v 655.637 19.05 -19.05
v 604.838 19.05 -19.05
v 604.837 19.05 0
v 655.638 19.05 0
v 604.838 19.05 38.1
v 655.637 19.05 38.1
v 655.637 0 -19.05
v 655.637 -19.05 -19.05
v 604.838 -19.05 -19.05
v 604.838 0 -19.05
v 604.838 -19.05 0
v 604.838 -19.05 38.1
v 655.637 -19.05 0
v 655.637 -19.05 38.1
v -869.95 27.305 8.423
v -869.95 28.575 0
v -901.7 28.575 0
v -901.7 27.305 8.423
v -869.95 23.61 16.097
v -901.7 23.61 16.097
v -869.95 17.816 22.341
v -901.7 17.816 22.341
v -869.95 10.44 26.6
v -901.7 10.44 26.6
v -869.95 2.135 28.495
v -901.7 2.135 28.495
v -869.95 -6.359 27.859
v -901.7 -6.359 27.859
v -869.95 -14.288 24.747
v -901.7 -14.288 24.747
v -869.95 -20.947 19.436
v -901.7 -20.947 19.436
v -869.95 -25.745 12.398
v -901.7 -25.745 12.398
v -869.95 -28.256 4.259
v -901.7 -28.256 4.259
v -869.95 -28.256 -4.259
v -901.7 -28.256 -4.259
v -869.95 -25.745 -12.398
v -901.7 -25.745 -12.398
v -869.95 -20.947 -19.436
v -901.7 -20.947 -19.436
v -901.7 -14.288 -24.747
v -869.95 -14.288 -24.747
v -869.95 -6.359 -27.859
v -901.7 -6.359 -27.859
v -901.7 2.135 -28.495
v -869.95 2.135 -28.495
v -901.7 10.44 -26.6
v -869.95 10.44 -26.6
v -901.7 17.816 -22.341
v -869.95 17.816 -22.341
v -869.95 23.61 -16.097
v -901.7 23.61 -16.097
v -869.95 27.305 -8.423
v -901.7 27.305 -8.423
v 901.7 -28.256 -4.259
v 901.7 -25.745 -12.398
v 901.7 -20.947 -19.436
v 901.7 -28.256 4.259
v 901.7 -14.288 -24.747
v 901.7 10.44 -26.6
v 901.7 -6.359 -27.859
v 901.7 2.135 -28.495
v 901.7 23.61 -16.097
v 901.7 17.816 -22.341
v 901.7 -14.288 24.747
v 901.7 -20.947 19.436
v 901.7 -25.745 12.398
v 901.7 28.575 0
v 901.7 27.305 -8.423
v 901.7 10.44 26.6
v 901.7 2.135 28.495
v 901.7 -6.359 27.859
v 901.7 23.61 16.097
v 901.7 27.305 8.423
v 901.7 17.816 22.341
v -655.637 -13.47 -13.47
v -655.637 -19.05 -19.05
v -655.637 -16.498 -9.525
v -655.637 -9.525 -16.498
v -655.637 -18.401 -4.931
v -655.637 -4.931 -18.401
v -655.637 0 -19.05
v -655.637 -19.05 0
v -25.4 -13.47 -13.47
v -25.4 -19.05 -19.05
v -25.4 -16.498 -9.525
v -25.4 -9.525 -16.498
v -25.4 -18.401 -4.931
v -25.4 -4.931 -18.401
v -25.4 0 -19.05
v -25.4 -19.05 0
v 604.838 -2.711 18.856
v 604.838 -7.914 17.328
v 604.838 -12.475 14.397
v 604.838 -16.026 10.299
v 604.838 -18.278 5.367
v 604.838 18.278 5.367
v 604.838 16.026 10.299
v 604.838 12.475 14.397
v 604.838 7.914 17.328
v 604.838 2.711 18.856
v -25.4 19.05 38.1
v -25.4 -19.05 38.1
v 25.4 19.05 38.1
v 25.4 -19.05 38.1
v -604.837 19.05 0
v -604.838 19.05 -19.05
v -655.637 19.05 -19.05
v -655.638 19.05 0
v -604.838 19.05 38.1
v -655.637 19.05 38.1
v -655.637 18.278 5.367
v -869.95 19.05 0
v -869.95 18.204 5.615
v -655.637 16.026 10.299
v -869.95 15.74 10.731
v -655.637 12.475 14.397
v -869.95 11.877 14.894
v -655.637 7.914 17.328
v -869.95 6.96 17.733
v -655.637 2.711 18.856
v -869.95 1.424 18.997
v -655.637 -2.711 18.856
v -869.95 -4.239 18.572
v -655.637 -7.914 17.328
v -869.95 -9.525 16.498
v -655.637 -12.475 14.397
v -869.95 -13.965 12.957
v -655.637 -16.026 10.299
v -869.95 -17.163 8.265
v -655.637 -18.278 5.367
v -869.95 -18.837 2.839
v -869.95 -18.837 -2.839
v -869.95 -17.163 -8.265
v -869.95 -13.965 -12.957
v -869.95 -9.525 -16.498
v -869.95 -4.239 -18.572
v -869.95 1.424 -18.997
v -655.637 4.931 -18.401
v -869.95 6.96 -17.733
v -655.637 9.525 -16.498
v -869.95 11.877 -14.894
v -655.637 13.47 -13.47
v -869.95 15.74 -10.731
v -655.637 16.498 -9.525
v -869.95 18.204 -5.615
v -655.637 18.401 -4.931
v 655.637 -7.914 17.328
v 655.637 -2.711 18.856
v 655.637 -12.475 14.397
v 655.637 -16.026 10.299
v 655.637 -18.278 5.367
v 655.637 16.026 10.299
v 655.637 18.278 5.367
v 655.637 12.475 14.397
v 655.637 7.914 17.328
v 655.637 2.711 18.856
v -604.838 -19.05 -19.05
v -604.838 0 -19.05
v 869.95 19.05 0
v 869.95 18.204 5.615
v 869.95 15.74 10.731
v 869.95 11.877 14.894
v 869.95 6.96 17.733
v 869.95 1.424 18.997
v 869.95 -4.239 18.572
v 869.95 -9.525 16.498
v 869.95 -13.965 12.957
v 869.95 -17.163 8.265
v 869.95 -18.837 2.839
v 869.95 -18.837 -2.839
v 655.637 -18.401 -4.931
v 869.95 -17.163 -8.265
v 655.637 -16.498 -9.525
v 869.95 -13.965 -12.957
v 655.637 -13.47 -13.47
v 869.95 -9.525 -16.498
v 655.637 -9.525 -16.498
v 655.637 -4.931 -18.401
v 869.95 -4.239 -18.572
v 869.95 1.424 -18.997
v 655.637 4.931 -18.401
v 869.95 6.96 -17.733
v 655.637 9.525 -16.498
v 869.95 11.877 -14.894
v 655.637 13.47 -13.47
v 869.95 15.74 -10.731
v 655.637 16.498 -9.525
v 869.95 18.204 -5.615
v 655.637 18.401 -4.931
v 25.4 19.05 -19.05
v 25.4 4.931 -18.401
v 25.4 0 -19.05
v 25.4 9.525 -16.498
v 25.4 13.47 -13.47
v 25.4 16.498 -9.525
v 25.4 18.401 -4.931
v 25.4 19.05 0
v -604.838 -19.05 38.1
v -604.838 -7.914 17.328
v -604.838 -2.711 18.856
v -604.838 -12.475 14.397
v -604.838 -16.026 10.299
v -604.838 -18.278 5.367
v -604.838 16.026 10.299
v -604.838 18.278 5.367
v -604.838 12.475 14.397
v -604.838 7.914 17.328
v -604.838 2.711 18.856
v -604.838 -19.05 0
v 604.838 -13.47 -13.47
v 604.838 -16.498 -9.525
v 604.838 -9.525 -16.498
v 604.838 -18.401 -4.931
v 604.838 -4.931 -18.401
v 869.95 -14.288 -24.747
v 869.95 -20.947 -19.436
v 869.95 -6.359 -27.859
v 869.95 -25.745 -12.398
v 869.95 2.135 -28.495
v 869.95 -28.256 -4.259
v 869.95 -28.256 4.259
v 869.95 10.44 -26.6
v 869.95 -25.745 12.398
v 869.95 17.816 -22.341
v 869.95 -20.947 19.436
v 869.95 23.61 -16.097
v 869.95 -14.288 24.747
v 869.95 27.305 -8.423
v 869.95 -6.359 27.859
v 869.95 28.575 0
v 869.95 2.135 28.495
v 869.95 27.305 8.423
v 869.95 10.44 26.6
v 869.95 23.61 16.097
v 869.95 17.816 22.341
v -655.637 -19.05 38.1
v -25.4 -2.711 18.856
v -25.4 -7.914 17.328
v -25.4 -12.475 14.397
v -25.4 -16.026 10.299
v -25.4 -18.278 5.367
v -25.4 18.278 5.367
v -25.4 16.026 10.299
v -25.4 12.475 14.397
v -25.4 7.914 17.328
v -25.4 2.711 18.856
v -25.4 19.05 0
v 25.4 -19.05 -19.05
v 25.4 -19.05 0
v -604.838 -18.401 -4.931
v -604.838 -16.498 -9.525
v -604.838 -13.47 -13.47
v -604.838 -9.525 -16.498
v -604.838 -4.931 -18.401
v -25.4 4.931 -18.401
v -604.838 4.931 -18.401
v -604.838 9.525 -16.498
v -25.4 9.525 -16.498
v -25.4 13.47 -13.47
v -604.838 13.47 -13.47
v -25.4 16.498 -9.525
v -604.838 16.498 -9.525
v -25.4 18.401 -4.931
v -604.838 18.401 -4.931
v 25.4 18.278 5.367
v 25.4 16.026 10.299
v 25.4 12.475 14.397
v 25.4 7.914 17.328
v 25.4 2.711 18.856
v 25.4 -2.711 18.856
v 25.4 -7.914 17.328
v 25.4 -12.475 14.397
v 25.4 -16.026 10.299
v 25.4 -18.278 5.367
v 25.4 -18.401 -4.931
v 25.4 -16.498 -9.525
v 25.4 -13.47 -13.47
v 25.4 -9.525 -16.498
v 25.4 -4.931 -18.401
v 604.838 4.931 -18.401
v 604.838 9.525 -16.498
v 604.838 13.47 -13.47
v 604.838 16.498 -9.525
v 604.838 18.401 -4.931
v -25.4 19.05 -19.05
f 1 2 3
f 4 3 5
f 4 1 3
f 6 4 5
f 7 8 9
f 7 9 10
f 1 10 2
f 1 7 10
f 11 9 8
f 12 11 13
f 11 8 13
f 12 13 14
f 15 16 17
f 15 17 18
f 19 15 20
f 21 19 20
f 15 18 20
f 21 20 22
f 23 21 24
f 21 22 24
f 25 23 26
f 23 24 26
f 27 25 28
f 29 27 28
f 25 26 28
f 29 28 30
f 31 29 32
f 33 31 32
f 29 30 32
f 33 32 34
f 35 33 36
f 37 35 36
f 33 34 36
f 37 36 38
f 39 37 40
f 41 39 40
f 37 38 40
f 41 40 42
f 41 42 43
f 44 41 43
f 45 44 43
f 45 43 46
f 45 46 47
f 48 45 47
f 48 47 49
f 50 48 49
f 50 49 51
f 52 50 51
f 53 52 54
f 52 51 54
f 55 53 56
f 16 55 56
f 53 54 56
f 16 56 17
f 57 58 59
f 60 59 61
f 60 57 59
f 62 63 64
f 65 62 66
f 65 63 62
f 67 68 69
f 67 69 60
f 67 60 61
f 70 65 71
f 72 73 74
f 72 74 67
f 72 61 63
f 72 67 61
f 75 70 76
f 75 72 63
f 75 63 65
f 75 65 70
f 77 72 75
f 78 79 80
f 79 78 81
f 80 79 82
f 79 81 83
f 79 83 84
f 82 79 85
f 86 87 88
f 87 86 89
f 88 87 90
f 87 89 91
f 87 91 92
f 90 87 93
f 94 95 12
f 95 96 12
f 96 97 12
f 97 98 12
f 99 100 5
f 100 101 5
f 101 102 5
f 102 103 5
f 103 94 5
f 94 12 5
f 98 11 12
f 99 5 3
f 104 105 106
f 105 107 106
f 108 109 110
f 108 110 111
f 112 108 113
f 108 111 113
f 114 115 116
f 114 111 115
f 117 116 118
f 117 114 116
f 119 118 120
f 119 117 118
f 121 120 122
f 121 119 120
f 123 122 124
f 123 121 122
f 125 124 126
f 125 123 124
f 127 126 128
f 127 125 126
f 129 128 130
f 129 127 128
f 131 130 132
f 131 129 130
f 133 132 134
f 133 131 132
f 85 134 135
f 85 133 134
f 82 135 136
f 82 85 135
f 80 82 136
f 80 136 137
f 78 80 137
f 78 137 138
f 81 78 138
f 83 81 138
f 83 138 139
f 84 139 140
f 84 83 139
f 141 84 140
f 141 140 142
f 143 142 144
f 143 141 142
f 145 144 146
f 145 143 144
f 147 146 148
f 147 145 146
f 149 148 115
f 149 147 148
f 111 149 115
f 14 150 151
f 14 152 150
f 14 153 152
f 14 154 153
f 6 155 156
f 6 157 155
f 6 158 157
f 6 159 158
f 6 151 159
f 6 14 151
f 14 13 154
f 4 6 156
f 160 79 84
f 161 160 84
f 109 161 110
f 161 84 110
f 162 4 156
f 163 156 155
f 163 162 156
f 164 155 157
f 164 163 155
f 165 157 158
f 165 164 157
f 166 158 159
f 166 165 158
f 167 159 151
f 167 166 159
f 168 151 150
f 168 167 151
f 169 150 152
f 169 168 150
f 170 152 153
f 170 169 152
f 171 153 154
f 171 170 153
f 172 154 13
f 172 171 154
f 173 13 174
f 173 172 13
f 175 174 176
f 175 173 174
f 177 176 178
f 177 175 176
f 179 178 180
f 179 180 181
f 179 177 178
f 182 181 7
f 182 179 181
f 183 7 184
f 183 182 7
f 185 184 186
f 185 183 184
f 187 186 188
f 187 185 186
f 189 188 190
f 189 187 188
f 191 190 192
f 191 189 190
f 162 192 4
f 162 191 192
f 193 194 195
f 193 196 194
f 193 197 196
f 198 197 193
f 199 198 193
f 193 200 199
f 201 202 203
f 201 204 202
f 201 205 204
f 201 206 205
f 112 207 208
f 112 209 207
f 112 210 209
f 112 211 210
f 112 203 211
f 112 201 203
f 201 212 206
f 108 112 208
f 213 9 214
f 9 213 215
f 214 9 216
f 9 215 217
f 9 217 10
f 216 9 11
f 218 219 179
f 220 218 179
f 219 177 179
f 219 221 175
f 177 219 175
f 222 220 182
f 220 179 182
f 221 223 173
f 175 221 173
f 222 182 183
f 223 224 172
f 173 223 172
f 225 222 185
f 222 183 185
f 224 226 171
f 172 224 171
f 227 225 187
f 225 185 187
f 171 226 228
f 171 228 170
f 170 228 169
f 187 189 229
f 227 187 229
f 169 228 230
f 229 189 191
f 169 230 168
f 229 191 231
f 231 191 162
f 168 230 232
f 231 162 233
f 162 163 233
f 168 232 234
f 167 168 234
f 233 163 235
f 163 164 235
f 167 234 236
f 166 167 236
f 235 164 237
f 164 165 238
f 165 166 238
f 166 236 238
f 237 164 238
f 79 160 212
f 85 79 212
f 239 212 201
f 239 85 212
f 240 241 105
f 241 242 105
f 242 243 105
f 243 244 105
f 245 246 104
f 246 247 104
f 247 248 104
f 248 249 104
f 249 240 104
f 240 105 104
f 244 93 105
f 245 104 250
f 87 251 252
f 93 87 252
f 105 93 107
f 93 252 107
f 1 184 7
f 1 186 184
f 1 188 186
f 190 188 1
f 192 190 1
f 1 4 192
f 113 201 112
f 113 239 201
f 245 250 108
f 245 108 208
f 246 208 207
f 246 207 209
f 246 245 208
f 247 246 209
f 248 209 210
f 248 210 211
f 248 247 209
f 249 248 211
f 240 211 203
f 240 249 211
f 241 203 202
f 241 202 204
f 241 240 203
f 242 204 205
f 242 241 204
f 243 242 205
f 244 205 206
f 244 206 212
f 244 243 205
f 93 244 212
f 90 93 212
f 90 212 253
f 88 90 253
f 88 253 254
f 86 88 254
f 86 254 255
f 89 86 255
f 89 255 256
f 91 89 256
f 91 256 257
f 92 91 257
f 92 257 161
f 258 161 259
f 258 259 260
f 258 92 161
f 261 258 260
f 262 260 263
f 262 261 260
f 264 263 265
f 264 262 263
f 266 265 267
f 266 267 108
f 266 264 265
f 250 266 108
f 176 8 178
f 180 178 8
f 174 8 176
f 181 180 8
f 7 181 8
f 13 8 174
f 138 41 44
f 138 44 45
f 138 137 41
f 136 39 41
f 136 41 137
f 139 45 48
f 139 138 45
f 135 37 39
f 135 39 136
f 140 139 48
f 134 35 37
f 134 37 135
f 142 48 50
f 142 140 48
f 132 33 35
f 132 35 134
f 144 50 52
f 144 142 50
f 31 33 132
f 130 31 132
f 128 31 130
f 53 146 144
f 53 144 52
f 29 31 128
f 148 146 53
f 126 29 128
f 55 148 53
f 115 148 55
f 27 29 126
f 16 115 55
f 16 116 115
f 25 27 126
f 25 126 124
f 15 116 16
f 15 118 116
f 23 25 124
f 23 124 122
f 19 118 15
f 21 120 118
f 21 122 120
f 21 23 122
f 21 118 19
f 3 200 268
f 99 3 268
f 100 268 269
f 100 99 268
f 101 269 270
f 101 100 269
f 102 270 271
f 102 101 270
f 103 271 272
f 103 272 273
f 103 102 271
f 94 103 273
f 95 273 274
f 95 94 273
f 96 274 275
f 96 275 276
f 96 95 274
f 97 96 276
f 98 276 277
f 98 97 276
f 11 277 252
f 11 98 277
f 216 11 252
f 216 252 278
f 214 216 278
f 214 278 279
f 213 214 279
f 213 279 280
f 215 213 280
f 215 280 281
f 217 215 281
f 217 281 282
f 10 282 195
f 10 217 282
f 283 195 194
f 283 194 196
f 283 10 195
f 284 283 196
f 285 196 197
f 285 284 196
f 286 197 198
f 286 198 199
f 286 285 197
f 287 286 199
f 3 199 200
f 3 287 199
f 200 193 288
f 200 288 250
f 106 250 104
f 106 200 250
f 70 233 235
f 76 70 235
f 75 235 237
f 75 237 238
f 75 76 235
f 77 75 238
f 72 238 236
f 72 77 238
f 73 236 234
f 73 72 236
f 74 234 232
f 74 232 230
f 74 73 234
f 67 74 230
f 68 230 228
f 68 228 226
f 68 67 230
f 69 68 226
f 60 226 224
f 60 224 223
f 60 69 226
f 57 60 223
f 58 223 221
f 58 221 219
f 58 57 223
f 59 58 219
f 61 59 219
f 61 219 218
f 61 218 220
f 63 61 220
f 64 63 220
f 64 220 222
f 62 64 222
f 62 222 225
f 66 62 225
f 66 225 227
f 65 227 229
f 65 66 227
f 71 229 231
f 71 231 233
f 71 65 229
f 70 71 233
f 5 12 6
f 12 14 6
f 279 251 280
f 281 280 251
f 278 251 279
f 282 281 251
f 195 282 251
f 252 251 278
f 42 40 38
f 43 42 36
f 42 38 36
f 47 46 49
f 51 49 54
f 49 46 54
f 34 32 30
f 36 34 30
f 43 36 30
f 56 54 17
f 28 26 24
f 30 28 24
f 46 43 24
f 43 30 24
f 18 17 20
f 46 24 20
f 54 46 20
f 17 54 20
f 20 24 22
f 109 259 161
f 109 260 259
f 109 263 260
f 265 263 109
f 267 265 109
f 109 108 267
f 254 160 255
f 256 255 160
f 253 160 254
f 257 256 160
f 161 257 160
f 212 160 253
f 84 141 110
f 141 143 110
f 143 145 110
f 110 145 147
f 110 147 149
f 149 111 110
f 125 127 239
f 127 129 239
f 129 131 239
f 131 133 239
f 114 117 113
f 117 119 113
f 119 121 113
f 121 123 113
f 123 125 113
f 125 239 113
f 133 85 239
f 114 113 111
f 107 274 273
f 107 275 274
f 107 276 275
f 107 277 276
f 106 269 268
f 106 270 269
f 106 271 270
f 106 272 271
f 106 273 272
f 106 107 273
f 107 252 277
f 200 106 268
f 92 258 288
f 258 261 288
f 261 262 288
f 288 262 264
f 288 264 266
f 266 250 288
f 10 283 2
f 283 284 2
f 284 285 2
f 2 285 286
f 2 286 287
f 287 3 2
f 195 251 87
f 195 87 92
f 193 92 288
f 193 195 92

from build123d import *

# Parameters (mm, degrees)
F0_R     = 19.05
F1_DEPTH = 901.7
F2_W     = 38.1
F2_H     = 57.15
F3_DEPTH = 25.4
F5_W     = 38.1
F5_H     = 57.15
F6_DEPTH = 25.4
F7_R     = 28.575
F7_R_2   = 19.05
F8_DEPTH = 31.75


with BuildPart() as f1:
    # F0 (on Right) → F1 (new body, symmetric)
    with BuildSketch(Plane.YZ):
        Circle(F0_R)
    extrude(amount=F1_DEPTH, both=True)

    # F2 (on Right) → F3 (join, symmetric)
    with BuildSketch(Plane.YZ):
        with Locations((0, 9.525)):
            Rectangle(F2_W, F2_H)
    extrude(amount=F3_DEPTH, both=True)

    # F5 (on offset) → F6 (join, symmetric)
    with BuildSketch(Plane.YZ.offset(630.2375)):
        with Locations((0, 9.525)):
            Rectangle(F5_W, F5_H)
    extrude(amount=F6_DEPTH, both=True)



with BuildPart() as f8:
    # F7 (on face) → F8 (new body)
    with BuildSketch(Plane.YZ.offset(901.7)):
        Circle(F7_R)
        Circle(F7_R_2, mode=Mode.SUBTRACT)
    extrude(amount=-F8_DEPTH)


with BuildPart() as f1_1:
    add(f1.part)

    add(f8.part)  # F9 merges F8
    # F9: F1, F8 across plane
    add(f1.part.mirror(Plane.YZ))
    add(f8.part.mirror(Plane.YZ))


solid = f1_1.part
